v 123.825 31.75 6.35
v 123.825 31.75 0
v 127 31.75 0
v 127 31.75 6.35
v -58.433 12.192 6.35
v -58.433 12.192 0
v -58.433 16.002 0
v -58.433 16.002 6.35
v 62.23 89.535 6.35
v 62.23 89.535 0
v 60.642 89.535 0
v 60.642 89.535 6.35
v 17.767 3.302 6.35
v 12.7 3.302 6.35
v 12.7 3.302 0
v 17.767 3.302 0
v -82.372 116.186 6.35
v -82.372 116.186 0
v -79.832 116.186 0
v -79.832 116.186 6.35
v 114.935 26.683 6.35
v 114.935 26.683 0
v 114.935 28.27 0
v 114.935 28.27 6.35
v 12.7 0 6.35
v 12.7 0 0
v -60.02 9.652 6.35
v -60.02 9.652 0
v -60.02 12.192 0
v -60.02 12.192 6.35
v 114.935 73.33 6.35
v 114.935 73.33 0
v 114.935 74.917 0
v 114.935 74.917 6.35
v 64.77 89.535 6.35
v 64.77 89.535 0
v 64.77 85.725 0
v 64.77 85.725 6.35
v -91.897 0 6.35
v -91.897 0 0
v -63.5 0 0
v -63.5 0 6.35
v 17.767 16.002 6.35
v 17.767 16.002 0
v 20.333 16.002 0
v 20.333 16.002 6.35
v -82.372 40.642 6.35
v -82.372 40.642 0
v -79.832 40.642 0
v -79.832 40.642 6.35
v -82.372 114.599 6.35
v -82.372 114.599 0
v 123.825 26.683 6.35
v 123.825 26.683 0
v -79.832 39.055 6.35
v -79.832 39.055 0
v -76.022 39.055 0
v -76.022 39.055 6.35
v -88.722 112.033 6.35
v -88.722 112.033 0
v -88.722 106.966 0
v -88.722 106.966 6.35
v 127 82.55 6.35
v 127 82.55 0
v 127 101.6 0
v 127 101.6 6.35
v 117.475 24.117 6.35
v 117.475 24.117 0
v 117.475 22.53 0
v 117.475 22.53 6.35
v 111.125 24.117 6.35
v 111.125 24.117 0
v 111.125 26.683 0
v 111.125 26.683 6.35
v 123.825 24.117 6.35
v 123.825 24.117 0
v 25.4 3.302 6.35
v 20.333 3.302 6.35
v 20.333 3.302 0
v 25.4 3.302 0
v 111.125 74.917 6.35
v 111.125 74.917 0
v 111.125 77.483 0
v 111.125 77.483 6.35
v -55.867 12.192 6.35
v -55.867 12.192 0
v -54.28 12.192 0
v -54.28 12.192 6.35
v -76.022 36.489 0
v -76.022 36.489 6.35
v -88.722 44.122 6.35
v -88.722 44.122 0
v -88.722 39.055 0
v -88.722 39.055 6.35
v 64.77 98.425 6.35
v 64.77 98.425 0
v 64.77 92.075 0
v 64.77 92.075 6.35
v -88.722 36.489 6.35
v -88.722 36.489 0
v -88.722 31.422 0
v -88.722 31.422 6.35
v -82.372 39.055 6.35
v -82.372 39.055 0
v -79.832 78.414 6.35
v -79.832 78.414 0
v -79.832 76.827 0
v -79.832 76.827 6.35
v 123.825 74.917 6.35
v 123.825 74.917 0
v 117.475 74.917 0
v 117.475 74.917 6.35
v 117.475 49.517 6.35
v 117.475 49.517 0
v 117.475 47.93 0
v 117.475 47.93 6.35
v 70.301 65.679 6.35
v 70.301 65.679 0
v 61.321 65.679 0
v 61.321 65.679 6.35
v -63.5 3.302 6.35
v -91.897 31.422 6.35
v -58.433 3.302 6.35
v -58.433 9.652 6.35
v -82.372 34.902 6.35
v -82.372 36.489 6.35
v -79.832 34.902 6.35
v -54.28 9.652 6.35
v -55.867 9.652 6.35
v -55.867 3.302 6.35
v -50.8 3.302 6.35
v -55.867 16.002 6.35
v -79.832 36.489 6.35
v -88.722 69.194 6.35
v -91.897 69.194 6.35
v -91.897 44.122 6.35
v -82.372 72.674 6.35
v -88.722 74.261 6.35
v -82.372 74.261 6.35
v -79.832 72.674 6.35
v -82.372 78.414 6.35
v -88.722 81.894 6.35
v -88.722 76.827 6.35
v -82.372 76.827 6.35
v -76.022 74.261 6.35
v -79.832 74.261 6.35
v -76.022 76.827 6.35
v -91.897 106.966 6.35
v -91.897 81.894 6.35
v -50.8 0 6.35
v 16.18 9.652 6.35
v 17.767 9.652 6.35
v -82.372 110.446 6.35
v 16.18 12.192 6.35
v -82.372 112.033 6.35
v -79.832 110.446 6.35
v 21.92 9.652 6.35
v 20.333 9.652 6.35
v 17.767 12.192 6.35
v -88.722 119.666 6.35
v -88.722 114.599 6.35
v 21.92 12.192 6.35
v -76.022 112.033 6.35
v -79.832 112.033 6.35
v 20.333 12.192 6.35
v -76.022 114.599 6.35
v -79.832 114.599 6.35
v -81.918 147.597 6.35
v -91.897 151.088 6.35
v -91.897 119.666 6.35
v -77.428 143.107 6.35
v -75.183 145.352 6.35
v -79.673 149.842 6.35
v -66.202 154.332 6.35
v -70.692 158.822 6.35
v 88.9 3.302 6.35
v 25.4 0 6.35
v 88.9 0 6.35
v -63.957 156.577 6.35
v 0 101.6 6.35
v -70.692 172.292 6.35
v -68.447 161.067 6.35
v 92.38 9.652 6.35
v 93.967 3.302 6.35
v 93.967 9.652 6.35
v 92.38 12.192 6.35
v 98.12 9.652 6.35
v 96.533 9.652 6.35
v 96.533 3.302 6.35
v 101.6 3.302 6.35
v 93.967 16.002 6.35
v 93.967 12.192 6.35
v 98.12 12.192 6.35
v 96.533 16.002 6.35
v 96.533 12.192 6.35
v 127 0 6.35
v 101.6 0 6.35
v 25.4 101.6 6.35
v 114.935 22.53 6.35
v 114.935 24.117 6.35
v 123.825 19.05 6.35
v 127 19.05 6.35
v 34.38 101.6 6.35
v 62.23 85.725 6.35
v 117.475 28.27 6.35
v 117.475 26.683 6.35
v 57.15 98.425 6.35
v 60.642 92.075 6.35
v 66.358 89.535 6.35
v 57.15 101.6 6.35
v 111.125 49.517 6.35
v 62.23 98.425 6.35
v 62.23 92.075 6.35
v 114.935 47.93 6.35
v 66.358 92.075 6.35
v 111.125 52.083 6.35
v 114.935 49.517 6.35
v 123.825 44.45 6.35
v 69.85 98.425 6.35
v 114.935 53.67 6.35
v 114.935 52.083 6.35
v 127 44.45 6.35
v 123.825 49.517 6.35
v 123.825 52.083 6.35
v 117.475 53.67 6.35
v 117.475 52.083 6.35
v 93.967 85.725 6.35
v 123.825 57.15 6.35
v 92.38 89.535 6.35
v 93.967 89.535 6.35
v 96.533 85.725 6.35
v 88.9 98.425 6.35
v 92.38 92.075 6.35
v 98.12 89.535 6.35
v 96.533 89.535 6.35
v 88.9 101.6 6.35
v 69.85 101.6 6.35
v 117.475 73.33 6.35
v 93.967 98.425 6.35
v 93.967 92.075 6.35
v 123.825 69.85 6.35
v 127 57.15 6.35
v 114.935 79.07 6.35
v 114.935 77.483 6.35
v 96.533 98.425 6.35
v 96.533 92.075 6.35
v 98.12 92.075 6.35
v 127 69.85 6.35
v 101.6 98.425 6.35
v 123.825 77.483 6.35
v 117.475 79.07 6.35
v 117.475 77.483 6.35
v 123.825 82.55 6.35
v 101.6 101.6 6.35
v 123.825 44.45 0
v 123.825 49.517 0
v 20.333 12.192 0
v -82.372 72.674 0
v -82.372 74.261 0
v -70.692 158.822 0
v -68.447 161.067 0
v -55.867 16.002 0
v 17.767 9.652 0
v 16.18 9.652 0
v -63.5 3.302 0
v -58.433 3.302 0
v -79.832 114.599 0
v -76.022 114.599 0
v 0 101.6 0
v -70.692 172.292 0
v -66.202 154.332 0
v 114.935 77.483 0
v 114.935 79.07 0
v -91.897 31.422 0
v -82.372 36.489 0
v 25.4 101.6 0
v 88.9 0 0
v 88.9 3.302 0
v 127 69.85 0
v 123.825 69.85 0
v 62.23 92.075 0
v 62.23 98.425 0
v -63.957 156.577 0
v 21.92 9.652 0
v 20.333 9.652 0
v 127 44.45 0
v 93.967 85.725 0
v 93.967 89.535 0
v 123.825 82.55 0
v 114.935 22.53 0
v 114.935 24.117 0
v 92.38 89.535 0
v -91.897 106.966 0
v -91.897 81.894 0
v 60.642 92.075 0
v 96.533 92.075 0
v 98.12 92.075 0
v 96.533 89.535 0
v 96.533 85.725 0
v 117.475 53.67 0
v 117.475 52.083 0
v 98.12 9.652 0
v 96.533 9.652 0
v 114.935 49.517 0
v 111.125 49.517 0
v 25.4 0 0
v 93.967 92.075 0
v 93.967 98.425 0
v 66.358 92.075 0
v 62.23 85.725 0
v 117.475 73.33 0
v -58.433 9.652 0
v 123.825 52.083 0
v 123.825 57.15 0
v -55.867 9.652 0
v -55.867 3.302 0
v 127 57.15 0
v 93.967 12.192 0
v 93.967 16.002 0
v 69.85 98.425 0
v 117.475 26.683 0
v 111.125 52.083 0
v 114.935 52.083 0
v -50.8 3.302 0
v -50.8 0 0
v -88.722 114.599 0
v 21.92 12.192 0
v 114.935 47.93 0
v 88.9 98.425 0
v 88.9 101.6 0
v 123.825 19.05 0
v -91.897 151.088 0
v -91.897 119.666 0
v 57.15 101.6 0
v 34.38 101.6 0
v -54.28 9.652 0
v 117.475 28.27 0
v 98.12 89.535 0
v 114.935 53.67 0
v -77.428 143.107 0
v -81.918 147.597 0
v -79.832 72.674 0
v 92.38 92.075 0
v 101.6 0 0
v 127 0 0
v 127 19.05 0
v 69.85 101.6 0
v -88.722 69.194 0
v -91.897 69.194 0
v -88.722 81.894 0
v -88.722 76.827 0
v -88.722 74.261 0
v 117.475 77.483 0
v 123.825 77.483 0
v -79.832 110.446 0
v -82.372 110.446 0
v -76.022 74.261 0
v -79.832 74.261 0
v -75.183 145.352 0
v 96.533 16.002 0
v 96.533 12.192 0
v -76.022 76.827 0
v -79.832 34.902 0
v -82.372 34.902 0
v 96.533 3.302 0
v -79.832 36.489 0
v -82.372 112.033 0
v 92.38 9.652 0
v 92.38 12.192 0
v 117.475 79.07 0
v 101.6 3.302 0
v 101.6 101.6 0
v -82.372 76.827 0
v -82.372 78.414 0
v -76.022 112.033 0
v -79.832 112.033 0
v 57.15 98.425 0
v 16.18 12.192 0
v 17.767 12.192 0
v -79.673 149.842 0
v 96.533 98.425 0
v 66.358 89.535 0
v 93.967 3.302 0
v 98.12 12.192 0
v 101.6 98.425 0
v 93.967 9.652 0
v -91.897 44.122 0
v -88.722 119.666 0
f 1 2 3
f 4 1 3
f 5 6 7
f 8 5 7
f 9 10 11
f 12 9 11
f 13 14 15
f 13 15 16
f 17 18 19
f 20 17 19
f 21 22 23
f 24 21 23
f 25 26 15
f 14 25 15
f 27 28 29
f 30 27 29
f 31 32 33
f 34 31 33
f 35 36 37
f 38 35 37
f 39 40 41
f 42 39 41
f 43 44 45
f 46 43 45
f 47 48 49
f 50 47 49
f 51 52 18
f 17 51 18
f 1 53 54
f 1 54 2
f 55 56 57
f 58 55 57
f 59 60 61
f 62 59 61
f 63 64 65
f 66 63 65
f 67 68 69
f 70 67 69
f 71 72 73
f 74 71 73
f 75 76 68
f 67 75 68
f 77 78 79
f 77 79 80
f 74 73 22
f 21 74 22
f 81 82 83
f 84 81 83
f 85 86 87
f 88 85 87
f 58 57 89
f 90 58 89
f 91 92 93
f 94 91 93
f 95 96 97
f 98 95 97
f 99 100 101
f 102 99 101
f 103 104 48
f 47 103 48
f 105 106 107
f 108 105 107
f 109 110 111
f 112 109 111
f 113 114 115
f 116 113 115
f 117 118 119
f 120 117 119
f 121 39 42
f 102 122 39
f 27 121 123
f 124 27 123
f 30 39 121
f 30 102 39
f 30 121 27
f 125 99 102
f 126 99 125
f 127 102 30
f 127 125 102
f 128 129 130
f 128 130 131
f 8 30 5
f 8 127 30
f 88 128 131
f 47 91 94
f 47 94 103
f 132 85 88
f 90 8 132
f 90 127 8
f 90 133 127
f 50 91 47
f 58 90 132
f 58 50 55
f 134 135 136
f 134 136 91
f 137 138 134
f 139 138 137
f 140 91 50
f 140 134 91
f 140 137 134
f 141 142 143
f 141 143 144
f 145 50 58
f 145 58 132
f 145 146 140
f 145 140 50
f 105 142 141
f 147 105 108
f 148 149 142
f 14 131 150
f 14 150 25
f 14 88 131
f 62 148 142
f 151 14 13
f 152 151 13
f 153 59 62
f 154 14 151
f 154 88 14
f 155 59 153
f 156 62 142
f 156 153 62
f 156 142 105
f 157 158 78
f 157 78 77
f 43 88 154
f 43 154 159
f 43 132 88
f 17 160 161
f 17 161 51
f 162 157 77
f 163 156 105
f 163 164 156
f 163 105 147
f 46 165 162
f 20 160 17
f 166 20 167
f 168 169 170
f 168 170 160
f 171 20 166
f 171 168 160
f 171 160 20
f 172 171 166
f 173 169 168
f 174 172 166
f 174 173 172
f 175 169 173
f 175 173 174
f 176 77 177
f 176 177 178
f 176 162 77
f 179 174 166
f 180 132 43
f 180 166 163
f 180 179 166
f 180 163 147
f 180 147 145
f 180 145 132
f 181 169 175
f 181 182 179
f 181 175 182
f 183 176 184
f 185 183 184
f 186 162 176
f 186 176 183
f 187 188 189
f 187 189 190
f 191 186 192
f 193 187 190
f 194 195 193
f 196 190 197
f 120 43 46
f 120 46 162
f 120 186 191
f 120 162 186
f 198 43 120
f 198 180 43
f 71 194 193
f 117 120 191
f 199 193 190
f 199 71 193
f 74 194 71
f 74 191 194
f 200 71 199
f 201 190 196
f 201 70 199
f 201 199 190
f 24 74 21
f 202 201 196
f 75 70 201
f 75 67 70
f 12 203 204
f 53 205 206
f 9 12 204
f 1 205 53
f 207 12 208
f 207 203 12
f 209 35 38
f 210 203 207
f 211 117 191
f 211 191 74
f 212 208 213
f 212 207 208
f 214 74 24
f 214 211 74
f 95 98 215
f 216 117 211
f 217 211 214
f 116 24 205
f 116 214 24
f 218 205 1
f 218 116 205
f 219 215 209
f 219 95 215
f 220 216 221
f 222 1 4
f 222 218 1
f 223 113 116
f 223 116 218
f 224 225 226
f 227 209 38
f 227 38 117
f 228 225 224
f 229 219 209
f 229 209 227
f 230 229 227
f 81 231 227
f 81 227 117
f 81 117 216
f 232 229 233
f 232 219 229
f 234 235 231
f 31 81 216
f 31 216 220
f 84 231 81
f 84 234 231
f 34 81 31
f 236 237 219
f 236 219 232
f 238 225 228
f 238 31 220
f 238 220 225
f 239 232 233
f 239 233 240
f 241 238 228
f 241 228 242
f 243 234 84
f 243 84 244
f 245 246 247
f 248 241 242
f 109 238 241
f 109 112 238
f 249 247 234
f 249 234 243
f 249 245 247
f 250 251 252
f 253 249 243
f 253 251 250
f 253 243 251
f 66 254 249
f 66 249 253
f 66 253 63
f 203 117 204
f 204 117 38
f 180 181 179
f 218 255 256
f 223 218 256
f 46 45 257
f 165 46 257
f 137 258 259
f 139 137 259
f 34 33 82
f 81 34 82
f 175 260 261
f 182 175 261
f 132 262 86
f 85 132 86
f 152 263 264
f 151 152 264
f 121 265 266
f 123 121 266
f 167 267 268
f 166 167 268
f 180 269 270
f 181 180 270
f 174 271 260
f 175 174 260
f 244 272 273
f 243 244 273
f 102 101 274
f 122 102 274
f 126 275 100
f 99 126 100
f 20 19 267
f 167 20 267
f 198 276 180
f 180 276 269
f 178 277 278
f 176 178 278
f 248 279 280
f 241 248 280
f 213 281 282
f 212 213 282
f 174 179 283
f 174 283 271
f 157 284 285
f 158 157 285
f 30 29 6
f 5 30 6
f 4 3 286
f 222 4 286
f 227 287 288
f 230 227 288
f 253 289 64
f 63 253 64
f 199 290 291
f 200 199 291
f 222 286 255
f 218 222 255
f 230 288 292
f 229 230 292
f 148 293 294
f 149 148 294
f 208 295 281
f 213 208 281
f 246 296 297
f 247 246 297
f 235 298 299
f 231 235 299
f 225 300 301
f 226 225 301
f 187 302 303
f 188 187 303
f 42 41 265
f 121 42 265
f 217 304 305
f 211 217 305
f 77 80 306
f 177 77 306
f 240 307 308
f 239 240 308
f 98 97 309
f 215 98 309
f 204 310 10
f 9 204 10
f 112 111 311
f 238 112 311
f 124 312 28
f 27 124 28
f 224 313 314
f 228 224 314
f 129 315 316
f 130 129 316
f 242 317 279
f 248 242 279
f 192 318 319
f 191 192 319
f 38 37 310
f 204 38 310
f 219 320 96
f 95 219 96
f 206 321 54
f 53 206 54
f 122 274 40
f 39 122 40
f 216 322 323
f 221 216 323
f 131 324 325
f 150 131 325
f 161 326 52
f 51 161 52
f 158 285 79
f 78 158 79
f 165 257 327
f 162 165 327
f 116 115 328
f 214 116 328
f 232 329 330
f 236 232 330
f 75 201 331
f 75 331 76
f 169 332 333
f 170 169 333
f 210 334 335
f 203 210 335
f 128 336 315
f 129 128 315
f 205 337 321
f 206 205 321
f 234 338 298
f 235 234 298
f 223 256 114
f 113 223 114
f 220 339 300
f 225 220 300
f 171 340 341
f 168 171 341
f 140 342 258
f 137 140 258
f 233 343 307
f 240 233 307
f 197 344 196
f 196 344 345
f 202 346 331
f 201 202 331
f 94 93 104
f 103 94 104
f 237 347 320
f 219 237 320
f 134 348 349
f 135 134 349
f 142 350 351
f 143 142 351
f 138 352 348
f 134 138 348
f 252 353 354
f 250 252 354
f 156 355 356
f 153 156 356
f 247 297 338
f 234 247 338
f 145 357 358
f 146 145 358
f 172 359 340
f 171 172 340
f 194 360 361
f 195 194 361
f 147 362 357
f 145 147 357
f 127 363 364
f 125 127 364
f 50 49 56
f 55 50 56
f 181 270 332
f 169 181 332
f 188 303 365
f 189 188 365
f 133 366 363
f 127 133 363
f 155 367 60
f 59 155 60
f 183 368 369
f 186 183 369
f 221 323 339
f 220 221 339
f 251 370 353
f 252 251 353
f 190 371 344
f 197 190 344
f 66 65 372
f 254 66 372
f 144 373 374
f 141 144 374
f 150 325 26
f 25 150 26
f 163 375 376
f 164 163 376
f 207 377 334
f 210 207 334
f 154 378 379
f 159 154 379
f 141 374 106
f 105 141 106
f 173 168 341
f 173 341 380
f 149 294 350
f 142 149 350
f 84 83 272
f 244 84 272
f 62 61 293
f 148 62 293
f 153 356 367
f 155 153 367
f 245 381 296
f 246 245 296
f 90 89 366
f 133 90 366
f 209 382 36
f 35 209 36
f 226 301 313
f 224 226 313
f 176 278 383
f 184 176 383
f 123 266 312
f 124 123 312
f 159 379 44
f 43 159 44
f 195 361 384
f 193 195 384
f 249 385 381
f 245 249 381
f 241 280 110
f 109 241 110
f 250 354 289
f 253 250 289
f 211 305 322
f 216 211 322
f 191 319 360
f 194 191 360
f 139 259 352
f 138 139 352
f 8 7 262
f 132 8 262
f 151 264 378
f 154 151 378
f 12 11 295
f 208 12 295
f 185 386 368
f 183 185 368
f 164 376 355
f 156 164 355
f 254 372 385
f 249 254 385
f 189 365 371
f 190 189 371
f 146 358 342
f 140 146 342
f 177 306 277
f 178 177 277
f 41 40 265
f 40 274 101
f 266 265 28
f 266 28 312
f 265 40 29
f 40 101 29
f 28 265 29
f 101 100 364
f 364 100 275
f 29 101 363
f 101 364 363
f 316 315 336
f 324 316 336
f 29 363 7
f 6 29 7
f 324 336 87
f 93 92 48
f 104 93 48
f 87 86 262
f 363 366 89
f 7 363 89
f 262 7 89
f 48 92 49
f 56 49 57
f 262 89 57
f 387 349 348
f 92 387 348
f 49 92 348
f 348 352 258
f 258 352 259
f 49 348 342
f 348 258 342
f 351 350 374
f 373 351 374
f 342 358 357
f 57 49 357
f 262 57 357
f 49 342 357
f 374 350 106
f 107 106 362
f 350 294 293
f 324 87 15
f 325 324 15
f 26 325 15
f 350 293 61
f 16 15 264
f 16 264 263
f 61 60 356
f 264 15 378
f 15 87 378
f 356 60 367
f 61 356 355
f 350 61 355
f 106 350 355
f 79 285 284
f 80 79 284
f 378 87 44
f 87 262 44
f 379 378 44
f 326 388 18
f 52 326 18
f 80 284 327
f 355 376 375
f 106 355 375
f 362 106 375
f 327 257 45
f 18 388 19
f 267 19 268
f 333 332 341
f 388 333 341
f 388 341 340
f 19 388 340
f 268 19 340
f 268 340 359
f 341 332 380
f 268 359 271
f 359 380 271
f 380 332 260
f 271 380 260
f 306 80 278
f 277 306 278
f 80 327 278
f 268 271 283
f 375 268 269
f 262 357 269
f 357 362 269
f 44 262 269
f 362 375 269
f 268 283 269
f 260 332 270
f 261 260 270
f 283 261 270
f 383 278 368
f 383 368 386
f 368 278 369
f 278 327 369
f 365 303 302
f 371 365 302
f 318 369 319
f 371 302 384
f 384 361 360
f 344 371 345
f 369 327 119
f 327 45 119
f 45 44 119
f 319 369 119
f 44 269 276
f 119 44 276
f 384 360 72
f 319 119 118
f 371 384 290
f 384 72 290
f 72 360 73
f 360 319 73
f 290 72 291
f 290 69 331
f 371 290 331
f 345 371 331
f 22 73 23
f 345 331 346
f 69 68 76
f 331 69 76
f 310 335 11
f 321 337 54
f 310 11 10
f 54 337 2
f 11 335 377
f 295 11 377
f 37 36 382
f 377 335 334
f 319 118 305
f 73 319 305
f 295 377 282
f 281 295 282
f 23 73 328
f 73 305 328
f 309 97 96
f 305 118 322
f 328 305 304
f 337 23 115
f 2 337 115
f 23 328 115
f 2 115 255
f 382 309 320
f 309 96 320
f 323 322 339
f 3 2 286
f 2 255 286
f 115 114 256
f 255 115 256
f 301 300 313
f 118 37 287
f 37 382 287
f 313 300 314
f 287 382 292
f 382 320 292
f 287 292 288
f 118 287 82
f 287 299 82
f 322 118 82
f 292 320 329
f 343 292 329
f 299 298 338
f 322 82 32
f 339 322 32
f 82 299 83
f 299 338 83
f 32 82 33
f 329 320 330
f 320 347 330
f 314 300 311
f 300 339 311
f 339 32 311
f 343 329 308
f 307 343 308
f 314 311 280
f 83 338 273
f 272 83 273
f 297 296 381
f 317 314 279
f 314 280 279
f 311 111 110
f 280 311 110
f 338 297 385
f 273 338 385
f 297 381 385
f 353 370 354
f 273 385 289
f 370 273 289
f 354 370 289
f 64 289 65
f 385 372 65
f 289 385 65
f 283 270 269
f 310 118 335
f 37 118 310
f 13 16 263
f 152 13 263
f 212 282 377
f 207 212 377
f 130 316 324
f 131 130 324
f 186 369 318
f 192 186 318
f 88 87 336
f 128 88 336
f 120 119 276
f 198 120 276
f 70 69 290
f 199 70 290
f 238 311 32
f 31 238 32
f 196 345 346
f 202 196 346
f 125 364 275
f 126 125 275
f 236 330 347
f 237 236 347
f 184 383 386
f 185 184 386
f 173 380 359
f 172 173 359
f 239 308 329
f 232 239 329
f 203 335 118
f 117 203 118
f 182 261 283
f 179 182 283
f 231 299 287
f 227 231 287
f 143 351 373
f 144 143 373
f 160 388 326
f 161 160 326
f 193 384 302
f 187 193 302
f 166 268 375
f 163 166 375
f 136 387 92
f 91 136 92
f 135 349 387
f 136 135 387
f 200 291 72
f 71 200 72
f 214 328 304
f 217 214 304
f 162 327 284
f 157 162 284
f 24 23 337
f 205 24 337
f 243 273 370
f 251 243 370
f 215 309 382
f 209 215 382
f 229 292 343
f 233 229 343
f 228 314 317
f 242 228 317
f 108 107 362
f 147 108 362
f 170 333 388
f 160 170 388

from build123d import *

# Parameters (mm, degrees)
BOSS_EXTRUDE1_DEPTH     = 6.35
CUT_EXTRUDE2_DEPTH      = 2.54
CUT_EXTRUDE2_DEPTH_BACK = 127
CUT_EXTRUDE4_DEPTH      = 127
CUT_EXTRUDE4_DEPTH_BACK = 127
CUT_EXTRUDE5_DEPTH      = 127
CUT_EXTRUDE5_DEPTH_BACK = 127


with BuildPart() as part:
    # Sketch1 → Boss-Extrude1 (new body)
    with BuildSketch(Plane.XY):
        Polygon((0, 0), (127, 0), (127, 101.6), (0, 101.6), (-70.692427737, 172.292427737), (-91.896861793, 151.087993682), (-91.896861793, 0), align=None)
    extrude(amount=BOSS_EXTRUDE1_DEPTH)

    # Sketch2 → Cut-Extrude2 (cut, two sides: drawn at the far end of the back side and taken through both)
    with BuildSketch(Plane(origin=(0, 0, 0), x_dir=(-1, 0, 0), z_dir=(0, 0, -1)).offset(-CUT_EXTRUDE2_DEPTH_BACK)):
        Polygon((-61.321024484, 65.678975516), (-25.4, 101.6), (-34.380256106, 101.6), (-52.340768348, 83.639487758), (-70.30128059, 65.678975516), align=None)
    extrude(amount=CUT_EXTRUDE2_DEPTH + CUT_EXTRUDE2_DEPTH_BACK, mode=Mode.SUBTRACT)

    # Sketch3 → Cut-Extrude4 (cut, two sides: drawn at the far end of the back side and taken through both)
    with BuildSketch(Plane(origin=(0, 0, 0), x_dir=(-1, 0, 0), z_dir=(0, 0, -1)).offset(-CUT_EXTRUDE4_DEPTH_BACK)):
        Polygon((68.447363707, 161.067107586), (63.957235647, 156.576979525), (66.202299677, 154.331915495), (70.692427737, 158.822043556), align=None)
        Polygon((-127, 31.75), (-127, 19.05), (-123.825, 19.05), (-123.825, 24.1173), (-117.475, 24.1173), (-117.475, 22.5298), (-114.935, 22.5298), (-114.935, 24.1173), (-111.125, 24.1173), (-111.125, 26.6827), (-114.935, 26.6827), (-114.935, 28.2702), (-117.475, 28.2702), (-117.475, 26.6827), (-123.825, 26.6827), (-123.825, 31.75), align=None)
        Polygon((-57.15, 101.6), (-69.85, 101.6), (-69.85, 98.425), (-64.77, 98.425), (-64.77, 92.075), (-66.3575, 92.075), (-66.3575, 89.535), (-64.77, 89.535), (-64.77, 85.725), (-62.23, 85.725), (-62.23, 89.535), (-60.6425, 89.535), (-60.6425, 92.075), (-62.23, 92.075), (-62.23, 98.425), (-57.15, 98.425), align=None)
        Polygon((-88.9, 101.6), (-101.6, 101.6), (-101.6, 98.425), (-96.5327, 98.425), (-96.5327, 92.075), (-98.1202, 92.075), (-98.1202, 89.535), (-96.5327, 89.535), (-96.5327, 85.725), (-93.9673, 85.725), (-93.9673, 89.535), (-92.3798, 89.535), (-92.3798, 92.075), (-93.9673, 92.075), (-93.9673, 98.425), (-88.9, 98.425), align=None)
        Polygon((-127, 82.55), (-127, 69.85), (-123.825, 69.85), (-123.825, 74.9173), (-117.475, 74.9173), (-117.475, 73.3298), (-114.935, 73.3298), (-114.935, 74.9173), (-111.125, 74.9173), (-111.125, 77.4827), (-114.935, 77.4827), (-114.935, 79.0702), (-117.475, 79.0702), (-117.475, 77.4827), (-123.825, 77.4827), (-123.825, 82.55), align=None)
        Polygon((-127, 57.15), (-127, 44.45), (-123.825, 44.45), (-123.825, 49.5173), (-117.475, 49.5173), (-117.475, 47.9298), (-114.935, 47.9298), (-114.935, 49.5173), (-111.125, 49.5173), (-111.125, 52.0827), (-114.935, 52.0827), (-114.935, 53.6702), (-117.475, 53.6702), (-117.475, 52.0827), (-123.825, 52.0827), (-123.825, 57.15), align=None)
        Polygon((88.721861793, 106.965995261), (91.896861793, 106.965995261), (91.896861793, 119.665995261), (88.721861793, 119.665995261), (88.721861793, 114.598695261), (82.371861793, 114.598695261), (82.371861793, 116.186195261), (79.831861793, 116.186195261), (79.831861793, 114.598695261), (76.021861793, 114.598695261), (76.021861793, 112.033295261), (79.831861793, 112.033295261), (79.831861793, 110.445795261), (82.371861793, 110.445795261), (82.371861793, 112.033295261), (88.721861793, 112.033295261), align=None)
        Polygon((88.721861793, 69.193996841), (91.896861793, 69.193996841), (91.896861793, 81.893996841), (88.721861793, 81.893996841), (88.721861793, 76.826696841), (82.371861793, 76.826696841), (82.371861793, 78.414196841), (79.831861793, 78.414196841), (79.831861793, 76.826696841), (76.021861793, 76.826696841), (76.021861793, 74.261296841), (79.831861793, 74.261296841), (79.831861793, 72.673796841), (82.371861793, 72.673796841), (82.371861793, 74.261296841), (88.721861793, 74.261296841), align=None)
        Polygon((88.721861793, 31.42199842), (91.896861793, 31.42199842), (91.896861793, 44.12199842), (88.721861793, 44.12199842), (88.721861793, 39.05469842), (82.371861793, 39.05469842), (82.371861793, 40.64219842), (79.831861793, 40.64219842), (79.831861793, 39.05469842), (76.021861793, 39.05469842), (76.021861793, 36.48929842), (79.831861793, 36.48929842), (79.831861793, 34.90179842), (82.371861793, 34.90179842), (82.371861793, 36.48929842), (88.721861793, 36.48929842), align=None)
        Polygon((50.8, 3.302), (50.8, 0), (63.5, 0), (63.5, 3.302), (58.4327, 3.302), (58.4327, 9.652), (60.0202, 9.652), (60.0202, 12.192), (58.4327, 12.192), (58.4327, 16.002), (55.8673, 16.002), (55.8673, 12.192), (54.2798, 12.192), (54.2798, 9.652), (55.8673, 9.652), (55.8673, 3.302), align=None)
        Polygon((-25.4, 3.302), (-25.4, 0), (-12.7, 0), (-12.7, 3.302), (-17.7673, 3.302), (-17.7673, 9.652), (-16.1798, 9.652), (-16.1798, 12.192), (-17.7673, 12.192), (-17.7673, 16.002), (-20.3327, 16.002), (-20.3327, 12.192), (-21.9202, 12.192), (-21.9202, 9.652), (-20.3327, 9.652), (-20.3327, 3.302), align=None)
        Polygon((-101.6, 3.302), (-101.6, 0), (-88.9, 0), (-88.9, 3.302), (-93.9673, 3.302), (-93.9673, 9.652), (-92.3798, 9.652), (-92.3798, 12.192), (-93.9673, 12.192), (-93.9673, 16.002), (-96.5327, 16.002), (-96.5327, 12.192), (-98.1202, 12.192), (-98.1202, 9.652), (-96.5327, 9.652), (-96.5327, 3.302), align=None)
    extrude(amount=CUT_EXTRUDE4_DEPTH + CUT_EXTRUDE4_DEPTH_BACK, mode=Mode.SUBTRACT)

    # Sketch4 → Cut-Extrude5 (cut, two sides: drawn at the far end of the back side and taken through both)
    with BuildSketch(Plane.XY.offset(-CUT_EXTRUDE5_DEPTH_BACK)):
        Polygon((-81.917747889, 147.596723404), (-79.672683858, 149.841787435), (-75.182555798, 145.351659374), (-77.427619828, 143.106595344), align=None)
    extrude(amount=CUT_EXTRUDE5_DEPTH + CUT_EXTRUDE5_DEPTH_BACK, mode=Mode.SUBTRACT)


solid = part.part
